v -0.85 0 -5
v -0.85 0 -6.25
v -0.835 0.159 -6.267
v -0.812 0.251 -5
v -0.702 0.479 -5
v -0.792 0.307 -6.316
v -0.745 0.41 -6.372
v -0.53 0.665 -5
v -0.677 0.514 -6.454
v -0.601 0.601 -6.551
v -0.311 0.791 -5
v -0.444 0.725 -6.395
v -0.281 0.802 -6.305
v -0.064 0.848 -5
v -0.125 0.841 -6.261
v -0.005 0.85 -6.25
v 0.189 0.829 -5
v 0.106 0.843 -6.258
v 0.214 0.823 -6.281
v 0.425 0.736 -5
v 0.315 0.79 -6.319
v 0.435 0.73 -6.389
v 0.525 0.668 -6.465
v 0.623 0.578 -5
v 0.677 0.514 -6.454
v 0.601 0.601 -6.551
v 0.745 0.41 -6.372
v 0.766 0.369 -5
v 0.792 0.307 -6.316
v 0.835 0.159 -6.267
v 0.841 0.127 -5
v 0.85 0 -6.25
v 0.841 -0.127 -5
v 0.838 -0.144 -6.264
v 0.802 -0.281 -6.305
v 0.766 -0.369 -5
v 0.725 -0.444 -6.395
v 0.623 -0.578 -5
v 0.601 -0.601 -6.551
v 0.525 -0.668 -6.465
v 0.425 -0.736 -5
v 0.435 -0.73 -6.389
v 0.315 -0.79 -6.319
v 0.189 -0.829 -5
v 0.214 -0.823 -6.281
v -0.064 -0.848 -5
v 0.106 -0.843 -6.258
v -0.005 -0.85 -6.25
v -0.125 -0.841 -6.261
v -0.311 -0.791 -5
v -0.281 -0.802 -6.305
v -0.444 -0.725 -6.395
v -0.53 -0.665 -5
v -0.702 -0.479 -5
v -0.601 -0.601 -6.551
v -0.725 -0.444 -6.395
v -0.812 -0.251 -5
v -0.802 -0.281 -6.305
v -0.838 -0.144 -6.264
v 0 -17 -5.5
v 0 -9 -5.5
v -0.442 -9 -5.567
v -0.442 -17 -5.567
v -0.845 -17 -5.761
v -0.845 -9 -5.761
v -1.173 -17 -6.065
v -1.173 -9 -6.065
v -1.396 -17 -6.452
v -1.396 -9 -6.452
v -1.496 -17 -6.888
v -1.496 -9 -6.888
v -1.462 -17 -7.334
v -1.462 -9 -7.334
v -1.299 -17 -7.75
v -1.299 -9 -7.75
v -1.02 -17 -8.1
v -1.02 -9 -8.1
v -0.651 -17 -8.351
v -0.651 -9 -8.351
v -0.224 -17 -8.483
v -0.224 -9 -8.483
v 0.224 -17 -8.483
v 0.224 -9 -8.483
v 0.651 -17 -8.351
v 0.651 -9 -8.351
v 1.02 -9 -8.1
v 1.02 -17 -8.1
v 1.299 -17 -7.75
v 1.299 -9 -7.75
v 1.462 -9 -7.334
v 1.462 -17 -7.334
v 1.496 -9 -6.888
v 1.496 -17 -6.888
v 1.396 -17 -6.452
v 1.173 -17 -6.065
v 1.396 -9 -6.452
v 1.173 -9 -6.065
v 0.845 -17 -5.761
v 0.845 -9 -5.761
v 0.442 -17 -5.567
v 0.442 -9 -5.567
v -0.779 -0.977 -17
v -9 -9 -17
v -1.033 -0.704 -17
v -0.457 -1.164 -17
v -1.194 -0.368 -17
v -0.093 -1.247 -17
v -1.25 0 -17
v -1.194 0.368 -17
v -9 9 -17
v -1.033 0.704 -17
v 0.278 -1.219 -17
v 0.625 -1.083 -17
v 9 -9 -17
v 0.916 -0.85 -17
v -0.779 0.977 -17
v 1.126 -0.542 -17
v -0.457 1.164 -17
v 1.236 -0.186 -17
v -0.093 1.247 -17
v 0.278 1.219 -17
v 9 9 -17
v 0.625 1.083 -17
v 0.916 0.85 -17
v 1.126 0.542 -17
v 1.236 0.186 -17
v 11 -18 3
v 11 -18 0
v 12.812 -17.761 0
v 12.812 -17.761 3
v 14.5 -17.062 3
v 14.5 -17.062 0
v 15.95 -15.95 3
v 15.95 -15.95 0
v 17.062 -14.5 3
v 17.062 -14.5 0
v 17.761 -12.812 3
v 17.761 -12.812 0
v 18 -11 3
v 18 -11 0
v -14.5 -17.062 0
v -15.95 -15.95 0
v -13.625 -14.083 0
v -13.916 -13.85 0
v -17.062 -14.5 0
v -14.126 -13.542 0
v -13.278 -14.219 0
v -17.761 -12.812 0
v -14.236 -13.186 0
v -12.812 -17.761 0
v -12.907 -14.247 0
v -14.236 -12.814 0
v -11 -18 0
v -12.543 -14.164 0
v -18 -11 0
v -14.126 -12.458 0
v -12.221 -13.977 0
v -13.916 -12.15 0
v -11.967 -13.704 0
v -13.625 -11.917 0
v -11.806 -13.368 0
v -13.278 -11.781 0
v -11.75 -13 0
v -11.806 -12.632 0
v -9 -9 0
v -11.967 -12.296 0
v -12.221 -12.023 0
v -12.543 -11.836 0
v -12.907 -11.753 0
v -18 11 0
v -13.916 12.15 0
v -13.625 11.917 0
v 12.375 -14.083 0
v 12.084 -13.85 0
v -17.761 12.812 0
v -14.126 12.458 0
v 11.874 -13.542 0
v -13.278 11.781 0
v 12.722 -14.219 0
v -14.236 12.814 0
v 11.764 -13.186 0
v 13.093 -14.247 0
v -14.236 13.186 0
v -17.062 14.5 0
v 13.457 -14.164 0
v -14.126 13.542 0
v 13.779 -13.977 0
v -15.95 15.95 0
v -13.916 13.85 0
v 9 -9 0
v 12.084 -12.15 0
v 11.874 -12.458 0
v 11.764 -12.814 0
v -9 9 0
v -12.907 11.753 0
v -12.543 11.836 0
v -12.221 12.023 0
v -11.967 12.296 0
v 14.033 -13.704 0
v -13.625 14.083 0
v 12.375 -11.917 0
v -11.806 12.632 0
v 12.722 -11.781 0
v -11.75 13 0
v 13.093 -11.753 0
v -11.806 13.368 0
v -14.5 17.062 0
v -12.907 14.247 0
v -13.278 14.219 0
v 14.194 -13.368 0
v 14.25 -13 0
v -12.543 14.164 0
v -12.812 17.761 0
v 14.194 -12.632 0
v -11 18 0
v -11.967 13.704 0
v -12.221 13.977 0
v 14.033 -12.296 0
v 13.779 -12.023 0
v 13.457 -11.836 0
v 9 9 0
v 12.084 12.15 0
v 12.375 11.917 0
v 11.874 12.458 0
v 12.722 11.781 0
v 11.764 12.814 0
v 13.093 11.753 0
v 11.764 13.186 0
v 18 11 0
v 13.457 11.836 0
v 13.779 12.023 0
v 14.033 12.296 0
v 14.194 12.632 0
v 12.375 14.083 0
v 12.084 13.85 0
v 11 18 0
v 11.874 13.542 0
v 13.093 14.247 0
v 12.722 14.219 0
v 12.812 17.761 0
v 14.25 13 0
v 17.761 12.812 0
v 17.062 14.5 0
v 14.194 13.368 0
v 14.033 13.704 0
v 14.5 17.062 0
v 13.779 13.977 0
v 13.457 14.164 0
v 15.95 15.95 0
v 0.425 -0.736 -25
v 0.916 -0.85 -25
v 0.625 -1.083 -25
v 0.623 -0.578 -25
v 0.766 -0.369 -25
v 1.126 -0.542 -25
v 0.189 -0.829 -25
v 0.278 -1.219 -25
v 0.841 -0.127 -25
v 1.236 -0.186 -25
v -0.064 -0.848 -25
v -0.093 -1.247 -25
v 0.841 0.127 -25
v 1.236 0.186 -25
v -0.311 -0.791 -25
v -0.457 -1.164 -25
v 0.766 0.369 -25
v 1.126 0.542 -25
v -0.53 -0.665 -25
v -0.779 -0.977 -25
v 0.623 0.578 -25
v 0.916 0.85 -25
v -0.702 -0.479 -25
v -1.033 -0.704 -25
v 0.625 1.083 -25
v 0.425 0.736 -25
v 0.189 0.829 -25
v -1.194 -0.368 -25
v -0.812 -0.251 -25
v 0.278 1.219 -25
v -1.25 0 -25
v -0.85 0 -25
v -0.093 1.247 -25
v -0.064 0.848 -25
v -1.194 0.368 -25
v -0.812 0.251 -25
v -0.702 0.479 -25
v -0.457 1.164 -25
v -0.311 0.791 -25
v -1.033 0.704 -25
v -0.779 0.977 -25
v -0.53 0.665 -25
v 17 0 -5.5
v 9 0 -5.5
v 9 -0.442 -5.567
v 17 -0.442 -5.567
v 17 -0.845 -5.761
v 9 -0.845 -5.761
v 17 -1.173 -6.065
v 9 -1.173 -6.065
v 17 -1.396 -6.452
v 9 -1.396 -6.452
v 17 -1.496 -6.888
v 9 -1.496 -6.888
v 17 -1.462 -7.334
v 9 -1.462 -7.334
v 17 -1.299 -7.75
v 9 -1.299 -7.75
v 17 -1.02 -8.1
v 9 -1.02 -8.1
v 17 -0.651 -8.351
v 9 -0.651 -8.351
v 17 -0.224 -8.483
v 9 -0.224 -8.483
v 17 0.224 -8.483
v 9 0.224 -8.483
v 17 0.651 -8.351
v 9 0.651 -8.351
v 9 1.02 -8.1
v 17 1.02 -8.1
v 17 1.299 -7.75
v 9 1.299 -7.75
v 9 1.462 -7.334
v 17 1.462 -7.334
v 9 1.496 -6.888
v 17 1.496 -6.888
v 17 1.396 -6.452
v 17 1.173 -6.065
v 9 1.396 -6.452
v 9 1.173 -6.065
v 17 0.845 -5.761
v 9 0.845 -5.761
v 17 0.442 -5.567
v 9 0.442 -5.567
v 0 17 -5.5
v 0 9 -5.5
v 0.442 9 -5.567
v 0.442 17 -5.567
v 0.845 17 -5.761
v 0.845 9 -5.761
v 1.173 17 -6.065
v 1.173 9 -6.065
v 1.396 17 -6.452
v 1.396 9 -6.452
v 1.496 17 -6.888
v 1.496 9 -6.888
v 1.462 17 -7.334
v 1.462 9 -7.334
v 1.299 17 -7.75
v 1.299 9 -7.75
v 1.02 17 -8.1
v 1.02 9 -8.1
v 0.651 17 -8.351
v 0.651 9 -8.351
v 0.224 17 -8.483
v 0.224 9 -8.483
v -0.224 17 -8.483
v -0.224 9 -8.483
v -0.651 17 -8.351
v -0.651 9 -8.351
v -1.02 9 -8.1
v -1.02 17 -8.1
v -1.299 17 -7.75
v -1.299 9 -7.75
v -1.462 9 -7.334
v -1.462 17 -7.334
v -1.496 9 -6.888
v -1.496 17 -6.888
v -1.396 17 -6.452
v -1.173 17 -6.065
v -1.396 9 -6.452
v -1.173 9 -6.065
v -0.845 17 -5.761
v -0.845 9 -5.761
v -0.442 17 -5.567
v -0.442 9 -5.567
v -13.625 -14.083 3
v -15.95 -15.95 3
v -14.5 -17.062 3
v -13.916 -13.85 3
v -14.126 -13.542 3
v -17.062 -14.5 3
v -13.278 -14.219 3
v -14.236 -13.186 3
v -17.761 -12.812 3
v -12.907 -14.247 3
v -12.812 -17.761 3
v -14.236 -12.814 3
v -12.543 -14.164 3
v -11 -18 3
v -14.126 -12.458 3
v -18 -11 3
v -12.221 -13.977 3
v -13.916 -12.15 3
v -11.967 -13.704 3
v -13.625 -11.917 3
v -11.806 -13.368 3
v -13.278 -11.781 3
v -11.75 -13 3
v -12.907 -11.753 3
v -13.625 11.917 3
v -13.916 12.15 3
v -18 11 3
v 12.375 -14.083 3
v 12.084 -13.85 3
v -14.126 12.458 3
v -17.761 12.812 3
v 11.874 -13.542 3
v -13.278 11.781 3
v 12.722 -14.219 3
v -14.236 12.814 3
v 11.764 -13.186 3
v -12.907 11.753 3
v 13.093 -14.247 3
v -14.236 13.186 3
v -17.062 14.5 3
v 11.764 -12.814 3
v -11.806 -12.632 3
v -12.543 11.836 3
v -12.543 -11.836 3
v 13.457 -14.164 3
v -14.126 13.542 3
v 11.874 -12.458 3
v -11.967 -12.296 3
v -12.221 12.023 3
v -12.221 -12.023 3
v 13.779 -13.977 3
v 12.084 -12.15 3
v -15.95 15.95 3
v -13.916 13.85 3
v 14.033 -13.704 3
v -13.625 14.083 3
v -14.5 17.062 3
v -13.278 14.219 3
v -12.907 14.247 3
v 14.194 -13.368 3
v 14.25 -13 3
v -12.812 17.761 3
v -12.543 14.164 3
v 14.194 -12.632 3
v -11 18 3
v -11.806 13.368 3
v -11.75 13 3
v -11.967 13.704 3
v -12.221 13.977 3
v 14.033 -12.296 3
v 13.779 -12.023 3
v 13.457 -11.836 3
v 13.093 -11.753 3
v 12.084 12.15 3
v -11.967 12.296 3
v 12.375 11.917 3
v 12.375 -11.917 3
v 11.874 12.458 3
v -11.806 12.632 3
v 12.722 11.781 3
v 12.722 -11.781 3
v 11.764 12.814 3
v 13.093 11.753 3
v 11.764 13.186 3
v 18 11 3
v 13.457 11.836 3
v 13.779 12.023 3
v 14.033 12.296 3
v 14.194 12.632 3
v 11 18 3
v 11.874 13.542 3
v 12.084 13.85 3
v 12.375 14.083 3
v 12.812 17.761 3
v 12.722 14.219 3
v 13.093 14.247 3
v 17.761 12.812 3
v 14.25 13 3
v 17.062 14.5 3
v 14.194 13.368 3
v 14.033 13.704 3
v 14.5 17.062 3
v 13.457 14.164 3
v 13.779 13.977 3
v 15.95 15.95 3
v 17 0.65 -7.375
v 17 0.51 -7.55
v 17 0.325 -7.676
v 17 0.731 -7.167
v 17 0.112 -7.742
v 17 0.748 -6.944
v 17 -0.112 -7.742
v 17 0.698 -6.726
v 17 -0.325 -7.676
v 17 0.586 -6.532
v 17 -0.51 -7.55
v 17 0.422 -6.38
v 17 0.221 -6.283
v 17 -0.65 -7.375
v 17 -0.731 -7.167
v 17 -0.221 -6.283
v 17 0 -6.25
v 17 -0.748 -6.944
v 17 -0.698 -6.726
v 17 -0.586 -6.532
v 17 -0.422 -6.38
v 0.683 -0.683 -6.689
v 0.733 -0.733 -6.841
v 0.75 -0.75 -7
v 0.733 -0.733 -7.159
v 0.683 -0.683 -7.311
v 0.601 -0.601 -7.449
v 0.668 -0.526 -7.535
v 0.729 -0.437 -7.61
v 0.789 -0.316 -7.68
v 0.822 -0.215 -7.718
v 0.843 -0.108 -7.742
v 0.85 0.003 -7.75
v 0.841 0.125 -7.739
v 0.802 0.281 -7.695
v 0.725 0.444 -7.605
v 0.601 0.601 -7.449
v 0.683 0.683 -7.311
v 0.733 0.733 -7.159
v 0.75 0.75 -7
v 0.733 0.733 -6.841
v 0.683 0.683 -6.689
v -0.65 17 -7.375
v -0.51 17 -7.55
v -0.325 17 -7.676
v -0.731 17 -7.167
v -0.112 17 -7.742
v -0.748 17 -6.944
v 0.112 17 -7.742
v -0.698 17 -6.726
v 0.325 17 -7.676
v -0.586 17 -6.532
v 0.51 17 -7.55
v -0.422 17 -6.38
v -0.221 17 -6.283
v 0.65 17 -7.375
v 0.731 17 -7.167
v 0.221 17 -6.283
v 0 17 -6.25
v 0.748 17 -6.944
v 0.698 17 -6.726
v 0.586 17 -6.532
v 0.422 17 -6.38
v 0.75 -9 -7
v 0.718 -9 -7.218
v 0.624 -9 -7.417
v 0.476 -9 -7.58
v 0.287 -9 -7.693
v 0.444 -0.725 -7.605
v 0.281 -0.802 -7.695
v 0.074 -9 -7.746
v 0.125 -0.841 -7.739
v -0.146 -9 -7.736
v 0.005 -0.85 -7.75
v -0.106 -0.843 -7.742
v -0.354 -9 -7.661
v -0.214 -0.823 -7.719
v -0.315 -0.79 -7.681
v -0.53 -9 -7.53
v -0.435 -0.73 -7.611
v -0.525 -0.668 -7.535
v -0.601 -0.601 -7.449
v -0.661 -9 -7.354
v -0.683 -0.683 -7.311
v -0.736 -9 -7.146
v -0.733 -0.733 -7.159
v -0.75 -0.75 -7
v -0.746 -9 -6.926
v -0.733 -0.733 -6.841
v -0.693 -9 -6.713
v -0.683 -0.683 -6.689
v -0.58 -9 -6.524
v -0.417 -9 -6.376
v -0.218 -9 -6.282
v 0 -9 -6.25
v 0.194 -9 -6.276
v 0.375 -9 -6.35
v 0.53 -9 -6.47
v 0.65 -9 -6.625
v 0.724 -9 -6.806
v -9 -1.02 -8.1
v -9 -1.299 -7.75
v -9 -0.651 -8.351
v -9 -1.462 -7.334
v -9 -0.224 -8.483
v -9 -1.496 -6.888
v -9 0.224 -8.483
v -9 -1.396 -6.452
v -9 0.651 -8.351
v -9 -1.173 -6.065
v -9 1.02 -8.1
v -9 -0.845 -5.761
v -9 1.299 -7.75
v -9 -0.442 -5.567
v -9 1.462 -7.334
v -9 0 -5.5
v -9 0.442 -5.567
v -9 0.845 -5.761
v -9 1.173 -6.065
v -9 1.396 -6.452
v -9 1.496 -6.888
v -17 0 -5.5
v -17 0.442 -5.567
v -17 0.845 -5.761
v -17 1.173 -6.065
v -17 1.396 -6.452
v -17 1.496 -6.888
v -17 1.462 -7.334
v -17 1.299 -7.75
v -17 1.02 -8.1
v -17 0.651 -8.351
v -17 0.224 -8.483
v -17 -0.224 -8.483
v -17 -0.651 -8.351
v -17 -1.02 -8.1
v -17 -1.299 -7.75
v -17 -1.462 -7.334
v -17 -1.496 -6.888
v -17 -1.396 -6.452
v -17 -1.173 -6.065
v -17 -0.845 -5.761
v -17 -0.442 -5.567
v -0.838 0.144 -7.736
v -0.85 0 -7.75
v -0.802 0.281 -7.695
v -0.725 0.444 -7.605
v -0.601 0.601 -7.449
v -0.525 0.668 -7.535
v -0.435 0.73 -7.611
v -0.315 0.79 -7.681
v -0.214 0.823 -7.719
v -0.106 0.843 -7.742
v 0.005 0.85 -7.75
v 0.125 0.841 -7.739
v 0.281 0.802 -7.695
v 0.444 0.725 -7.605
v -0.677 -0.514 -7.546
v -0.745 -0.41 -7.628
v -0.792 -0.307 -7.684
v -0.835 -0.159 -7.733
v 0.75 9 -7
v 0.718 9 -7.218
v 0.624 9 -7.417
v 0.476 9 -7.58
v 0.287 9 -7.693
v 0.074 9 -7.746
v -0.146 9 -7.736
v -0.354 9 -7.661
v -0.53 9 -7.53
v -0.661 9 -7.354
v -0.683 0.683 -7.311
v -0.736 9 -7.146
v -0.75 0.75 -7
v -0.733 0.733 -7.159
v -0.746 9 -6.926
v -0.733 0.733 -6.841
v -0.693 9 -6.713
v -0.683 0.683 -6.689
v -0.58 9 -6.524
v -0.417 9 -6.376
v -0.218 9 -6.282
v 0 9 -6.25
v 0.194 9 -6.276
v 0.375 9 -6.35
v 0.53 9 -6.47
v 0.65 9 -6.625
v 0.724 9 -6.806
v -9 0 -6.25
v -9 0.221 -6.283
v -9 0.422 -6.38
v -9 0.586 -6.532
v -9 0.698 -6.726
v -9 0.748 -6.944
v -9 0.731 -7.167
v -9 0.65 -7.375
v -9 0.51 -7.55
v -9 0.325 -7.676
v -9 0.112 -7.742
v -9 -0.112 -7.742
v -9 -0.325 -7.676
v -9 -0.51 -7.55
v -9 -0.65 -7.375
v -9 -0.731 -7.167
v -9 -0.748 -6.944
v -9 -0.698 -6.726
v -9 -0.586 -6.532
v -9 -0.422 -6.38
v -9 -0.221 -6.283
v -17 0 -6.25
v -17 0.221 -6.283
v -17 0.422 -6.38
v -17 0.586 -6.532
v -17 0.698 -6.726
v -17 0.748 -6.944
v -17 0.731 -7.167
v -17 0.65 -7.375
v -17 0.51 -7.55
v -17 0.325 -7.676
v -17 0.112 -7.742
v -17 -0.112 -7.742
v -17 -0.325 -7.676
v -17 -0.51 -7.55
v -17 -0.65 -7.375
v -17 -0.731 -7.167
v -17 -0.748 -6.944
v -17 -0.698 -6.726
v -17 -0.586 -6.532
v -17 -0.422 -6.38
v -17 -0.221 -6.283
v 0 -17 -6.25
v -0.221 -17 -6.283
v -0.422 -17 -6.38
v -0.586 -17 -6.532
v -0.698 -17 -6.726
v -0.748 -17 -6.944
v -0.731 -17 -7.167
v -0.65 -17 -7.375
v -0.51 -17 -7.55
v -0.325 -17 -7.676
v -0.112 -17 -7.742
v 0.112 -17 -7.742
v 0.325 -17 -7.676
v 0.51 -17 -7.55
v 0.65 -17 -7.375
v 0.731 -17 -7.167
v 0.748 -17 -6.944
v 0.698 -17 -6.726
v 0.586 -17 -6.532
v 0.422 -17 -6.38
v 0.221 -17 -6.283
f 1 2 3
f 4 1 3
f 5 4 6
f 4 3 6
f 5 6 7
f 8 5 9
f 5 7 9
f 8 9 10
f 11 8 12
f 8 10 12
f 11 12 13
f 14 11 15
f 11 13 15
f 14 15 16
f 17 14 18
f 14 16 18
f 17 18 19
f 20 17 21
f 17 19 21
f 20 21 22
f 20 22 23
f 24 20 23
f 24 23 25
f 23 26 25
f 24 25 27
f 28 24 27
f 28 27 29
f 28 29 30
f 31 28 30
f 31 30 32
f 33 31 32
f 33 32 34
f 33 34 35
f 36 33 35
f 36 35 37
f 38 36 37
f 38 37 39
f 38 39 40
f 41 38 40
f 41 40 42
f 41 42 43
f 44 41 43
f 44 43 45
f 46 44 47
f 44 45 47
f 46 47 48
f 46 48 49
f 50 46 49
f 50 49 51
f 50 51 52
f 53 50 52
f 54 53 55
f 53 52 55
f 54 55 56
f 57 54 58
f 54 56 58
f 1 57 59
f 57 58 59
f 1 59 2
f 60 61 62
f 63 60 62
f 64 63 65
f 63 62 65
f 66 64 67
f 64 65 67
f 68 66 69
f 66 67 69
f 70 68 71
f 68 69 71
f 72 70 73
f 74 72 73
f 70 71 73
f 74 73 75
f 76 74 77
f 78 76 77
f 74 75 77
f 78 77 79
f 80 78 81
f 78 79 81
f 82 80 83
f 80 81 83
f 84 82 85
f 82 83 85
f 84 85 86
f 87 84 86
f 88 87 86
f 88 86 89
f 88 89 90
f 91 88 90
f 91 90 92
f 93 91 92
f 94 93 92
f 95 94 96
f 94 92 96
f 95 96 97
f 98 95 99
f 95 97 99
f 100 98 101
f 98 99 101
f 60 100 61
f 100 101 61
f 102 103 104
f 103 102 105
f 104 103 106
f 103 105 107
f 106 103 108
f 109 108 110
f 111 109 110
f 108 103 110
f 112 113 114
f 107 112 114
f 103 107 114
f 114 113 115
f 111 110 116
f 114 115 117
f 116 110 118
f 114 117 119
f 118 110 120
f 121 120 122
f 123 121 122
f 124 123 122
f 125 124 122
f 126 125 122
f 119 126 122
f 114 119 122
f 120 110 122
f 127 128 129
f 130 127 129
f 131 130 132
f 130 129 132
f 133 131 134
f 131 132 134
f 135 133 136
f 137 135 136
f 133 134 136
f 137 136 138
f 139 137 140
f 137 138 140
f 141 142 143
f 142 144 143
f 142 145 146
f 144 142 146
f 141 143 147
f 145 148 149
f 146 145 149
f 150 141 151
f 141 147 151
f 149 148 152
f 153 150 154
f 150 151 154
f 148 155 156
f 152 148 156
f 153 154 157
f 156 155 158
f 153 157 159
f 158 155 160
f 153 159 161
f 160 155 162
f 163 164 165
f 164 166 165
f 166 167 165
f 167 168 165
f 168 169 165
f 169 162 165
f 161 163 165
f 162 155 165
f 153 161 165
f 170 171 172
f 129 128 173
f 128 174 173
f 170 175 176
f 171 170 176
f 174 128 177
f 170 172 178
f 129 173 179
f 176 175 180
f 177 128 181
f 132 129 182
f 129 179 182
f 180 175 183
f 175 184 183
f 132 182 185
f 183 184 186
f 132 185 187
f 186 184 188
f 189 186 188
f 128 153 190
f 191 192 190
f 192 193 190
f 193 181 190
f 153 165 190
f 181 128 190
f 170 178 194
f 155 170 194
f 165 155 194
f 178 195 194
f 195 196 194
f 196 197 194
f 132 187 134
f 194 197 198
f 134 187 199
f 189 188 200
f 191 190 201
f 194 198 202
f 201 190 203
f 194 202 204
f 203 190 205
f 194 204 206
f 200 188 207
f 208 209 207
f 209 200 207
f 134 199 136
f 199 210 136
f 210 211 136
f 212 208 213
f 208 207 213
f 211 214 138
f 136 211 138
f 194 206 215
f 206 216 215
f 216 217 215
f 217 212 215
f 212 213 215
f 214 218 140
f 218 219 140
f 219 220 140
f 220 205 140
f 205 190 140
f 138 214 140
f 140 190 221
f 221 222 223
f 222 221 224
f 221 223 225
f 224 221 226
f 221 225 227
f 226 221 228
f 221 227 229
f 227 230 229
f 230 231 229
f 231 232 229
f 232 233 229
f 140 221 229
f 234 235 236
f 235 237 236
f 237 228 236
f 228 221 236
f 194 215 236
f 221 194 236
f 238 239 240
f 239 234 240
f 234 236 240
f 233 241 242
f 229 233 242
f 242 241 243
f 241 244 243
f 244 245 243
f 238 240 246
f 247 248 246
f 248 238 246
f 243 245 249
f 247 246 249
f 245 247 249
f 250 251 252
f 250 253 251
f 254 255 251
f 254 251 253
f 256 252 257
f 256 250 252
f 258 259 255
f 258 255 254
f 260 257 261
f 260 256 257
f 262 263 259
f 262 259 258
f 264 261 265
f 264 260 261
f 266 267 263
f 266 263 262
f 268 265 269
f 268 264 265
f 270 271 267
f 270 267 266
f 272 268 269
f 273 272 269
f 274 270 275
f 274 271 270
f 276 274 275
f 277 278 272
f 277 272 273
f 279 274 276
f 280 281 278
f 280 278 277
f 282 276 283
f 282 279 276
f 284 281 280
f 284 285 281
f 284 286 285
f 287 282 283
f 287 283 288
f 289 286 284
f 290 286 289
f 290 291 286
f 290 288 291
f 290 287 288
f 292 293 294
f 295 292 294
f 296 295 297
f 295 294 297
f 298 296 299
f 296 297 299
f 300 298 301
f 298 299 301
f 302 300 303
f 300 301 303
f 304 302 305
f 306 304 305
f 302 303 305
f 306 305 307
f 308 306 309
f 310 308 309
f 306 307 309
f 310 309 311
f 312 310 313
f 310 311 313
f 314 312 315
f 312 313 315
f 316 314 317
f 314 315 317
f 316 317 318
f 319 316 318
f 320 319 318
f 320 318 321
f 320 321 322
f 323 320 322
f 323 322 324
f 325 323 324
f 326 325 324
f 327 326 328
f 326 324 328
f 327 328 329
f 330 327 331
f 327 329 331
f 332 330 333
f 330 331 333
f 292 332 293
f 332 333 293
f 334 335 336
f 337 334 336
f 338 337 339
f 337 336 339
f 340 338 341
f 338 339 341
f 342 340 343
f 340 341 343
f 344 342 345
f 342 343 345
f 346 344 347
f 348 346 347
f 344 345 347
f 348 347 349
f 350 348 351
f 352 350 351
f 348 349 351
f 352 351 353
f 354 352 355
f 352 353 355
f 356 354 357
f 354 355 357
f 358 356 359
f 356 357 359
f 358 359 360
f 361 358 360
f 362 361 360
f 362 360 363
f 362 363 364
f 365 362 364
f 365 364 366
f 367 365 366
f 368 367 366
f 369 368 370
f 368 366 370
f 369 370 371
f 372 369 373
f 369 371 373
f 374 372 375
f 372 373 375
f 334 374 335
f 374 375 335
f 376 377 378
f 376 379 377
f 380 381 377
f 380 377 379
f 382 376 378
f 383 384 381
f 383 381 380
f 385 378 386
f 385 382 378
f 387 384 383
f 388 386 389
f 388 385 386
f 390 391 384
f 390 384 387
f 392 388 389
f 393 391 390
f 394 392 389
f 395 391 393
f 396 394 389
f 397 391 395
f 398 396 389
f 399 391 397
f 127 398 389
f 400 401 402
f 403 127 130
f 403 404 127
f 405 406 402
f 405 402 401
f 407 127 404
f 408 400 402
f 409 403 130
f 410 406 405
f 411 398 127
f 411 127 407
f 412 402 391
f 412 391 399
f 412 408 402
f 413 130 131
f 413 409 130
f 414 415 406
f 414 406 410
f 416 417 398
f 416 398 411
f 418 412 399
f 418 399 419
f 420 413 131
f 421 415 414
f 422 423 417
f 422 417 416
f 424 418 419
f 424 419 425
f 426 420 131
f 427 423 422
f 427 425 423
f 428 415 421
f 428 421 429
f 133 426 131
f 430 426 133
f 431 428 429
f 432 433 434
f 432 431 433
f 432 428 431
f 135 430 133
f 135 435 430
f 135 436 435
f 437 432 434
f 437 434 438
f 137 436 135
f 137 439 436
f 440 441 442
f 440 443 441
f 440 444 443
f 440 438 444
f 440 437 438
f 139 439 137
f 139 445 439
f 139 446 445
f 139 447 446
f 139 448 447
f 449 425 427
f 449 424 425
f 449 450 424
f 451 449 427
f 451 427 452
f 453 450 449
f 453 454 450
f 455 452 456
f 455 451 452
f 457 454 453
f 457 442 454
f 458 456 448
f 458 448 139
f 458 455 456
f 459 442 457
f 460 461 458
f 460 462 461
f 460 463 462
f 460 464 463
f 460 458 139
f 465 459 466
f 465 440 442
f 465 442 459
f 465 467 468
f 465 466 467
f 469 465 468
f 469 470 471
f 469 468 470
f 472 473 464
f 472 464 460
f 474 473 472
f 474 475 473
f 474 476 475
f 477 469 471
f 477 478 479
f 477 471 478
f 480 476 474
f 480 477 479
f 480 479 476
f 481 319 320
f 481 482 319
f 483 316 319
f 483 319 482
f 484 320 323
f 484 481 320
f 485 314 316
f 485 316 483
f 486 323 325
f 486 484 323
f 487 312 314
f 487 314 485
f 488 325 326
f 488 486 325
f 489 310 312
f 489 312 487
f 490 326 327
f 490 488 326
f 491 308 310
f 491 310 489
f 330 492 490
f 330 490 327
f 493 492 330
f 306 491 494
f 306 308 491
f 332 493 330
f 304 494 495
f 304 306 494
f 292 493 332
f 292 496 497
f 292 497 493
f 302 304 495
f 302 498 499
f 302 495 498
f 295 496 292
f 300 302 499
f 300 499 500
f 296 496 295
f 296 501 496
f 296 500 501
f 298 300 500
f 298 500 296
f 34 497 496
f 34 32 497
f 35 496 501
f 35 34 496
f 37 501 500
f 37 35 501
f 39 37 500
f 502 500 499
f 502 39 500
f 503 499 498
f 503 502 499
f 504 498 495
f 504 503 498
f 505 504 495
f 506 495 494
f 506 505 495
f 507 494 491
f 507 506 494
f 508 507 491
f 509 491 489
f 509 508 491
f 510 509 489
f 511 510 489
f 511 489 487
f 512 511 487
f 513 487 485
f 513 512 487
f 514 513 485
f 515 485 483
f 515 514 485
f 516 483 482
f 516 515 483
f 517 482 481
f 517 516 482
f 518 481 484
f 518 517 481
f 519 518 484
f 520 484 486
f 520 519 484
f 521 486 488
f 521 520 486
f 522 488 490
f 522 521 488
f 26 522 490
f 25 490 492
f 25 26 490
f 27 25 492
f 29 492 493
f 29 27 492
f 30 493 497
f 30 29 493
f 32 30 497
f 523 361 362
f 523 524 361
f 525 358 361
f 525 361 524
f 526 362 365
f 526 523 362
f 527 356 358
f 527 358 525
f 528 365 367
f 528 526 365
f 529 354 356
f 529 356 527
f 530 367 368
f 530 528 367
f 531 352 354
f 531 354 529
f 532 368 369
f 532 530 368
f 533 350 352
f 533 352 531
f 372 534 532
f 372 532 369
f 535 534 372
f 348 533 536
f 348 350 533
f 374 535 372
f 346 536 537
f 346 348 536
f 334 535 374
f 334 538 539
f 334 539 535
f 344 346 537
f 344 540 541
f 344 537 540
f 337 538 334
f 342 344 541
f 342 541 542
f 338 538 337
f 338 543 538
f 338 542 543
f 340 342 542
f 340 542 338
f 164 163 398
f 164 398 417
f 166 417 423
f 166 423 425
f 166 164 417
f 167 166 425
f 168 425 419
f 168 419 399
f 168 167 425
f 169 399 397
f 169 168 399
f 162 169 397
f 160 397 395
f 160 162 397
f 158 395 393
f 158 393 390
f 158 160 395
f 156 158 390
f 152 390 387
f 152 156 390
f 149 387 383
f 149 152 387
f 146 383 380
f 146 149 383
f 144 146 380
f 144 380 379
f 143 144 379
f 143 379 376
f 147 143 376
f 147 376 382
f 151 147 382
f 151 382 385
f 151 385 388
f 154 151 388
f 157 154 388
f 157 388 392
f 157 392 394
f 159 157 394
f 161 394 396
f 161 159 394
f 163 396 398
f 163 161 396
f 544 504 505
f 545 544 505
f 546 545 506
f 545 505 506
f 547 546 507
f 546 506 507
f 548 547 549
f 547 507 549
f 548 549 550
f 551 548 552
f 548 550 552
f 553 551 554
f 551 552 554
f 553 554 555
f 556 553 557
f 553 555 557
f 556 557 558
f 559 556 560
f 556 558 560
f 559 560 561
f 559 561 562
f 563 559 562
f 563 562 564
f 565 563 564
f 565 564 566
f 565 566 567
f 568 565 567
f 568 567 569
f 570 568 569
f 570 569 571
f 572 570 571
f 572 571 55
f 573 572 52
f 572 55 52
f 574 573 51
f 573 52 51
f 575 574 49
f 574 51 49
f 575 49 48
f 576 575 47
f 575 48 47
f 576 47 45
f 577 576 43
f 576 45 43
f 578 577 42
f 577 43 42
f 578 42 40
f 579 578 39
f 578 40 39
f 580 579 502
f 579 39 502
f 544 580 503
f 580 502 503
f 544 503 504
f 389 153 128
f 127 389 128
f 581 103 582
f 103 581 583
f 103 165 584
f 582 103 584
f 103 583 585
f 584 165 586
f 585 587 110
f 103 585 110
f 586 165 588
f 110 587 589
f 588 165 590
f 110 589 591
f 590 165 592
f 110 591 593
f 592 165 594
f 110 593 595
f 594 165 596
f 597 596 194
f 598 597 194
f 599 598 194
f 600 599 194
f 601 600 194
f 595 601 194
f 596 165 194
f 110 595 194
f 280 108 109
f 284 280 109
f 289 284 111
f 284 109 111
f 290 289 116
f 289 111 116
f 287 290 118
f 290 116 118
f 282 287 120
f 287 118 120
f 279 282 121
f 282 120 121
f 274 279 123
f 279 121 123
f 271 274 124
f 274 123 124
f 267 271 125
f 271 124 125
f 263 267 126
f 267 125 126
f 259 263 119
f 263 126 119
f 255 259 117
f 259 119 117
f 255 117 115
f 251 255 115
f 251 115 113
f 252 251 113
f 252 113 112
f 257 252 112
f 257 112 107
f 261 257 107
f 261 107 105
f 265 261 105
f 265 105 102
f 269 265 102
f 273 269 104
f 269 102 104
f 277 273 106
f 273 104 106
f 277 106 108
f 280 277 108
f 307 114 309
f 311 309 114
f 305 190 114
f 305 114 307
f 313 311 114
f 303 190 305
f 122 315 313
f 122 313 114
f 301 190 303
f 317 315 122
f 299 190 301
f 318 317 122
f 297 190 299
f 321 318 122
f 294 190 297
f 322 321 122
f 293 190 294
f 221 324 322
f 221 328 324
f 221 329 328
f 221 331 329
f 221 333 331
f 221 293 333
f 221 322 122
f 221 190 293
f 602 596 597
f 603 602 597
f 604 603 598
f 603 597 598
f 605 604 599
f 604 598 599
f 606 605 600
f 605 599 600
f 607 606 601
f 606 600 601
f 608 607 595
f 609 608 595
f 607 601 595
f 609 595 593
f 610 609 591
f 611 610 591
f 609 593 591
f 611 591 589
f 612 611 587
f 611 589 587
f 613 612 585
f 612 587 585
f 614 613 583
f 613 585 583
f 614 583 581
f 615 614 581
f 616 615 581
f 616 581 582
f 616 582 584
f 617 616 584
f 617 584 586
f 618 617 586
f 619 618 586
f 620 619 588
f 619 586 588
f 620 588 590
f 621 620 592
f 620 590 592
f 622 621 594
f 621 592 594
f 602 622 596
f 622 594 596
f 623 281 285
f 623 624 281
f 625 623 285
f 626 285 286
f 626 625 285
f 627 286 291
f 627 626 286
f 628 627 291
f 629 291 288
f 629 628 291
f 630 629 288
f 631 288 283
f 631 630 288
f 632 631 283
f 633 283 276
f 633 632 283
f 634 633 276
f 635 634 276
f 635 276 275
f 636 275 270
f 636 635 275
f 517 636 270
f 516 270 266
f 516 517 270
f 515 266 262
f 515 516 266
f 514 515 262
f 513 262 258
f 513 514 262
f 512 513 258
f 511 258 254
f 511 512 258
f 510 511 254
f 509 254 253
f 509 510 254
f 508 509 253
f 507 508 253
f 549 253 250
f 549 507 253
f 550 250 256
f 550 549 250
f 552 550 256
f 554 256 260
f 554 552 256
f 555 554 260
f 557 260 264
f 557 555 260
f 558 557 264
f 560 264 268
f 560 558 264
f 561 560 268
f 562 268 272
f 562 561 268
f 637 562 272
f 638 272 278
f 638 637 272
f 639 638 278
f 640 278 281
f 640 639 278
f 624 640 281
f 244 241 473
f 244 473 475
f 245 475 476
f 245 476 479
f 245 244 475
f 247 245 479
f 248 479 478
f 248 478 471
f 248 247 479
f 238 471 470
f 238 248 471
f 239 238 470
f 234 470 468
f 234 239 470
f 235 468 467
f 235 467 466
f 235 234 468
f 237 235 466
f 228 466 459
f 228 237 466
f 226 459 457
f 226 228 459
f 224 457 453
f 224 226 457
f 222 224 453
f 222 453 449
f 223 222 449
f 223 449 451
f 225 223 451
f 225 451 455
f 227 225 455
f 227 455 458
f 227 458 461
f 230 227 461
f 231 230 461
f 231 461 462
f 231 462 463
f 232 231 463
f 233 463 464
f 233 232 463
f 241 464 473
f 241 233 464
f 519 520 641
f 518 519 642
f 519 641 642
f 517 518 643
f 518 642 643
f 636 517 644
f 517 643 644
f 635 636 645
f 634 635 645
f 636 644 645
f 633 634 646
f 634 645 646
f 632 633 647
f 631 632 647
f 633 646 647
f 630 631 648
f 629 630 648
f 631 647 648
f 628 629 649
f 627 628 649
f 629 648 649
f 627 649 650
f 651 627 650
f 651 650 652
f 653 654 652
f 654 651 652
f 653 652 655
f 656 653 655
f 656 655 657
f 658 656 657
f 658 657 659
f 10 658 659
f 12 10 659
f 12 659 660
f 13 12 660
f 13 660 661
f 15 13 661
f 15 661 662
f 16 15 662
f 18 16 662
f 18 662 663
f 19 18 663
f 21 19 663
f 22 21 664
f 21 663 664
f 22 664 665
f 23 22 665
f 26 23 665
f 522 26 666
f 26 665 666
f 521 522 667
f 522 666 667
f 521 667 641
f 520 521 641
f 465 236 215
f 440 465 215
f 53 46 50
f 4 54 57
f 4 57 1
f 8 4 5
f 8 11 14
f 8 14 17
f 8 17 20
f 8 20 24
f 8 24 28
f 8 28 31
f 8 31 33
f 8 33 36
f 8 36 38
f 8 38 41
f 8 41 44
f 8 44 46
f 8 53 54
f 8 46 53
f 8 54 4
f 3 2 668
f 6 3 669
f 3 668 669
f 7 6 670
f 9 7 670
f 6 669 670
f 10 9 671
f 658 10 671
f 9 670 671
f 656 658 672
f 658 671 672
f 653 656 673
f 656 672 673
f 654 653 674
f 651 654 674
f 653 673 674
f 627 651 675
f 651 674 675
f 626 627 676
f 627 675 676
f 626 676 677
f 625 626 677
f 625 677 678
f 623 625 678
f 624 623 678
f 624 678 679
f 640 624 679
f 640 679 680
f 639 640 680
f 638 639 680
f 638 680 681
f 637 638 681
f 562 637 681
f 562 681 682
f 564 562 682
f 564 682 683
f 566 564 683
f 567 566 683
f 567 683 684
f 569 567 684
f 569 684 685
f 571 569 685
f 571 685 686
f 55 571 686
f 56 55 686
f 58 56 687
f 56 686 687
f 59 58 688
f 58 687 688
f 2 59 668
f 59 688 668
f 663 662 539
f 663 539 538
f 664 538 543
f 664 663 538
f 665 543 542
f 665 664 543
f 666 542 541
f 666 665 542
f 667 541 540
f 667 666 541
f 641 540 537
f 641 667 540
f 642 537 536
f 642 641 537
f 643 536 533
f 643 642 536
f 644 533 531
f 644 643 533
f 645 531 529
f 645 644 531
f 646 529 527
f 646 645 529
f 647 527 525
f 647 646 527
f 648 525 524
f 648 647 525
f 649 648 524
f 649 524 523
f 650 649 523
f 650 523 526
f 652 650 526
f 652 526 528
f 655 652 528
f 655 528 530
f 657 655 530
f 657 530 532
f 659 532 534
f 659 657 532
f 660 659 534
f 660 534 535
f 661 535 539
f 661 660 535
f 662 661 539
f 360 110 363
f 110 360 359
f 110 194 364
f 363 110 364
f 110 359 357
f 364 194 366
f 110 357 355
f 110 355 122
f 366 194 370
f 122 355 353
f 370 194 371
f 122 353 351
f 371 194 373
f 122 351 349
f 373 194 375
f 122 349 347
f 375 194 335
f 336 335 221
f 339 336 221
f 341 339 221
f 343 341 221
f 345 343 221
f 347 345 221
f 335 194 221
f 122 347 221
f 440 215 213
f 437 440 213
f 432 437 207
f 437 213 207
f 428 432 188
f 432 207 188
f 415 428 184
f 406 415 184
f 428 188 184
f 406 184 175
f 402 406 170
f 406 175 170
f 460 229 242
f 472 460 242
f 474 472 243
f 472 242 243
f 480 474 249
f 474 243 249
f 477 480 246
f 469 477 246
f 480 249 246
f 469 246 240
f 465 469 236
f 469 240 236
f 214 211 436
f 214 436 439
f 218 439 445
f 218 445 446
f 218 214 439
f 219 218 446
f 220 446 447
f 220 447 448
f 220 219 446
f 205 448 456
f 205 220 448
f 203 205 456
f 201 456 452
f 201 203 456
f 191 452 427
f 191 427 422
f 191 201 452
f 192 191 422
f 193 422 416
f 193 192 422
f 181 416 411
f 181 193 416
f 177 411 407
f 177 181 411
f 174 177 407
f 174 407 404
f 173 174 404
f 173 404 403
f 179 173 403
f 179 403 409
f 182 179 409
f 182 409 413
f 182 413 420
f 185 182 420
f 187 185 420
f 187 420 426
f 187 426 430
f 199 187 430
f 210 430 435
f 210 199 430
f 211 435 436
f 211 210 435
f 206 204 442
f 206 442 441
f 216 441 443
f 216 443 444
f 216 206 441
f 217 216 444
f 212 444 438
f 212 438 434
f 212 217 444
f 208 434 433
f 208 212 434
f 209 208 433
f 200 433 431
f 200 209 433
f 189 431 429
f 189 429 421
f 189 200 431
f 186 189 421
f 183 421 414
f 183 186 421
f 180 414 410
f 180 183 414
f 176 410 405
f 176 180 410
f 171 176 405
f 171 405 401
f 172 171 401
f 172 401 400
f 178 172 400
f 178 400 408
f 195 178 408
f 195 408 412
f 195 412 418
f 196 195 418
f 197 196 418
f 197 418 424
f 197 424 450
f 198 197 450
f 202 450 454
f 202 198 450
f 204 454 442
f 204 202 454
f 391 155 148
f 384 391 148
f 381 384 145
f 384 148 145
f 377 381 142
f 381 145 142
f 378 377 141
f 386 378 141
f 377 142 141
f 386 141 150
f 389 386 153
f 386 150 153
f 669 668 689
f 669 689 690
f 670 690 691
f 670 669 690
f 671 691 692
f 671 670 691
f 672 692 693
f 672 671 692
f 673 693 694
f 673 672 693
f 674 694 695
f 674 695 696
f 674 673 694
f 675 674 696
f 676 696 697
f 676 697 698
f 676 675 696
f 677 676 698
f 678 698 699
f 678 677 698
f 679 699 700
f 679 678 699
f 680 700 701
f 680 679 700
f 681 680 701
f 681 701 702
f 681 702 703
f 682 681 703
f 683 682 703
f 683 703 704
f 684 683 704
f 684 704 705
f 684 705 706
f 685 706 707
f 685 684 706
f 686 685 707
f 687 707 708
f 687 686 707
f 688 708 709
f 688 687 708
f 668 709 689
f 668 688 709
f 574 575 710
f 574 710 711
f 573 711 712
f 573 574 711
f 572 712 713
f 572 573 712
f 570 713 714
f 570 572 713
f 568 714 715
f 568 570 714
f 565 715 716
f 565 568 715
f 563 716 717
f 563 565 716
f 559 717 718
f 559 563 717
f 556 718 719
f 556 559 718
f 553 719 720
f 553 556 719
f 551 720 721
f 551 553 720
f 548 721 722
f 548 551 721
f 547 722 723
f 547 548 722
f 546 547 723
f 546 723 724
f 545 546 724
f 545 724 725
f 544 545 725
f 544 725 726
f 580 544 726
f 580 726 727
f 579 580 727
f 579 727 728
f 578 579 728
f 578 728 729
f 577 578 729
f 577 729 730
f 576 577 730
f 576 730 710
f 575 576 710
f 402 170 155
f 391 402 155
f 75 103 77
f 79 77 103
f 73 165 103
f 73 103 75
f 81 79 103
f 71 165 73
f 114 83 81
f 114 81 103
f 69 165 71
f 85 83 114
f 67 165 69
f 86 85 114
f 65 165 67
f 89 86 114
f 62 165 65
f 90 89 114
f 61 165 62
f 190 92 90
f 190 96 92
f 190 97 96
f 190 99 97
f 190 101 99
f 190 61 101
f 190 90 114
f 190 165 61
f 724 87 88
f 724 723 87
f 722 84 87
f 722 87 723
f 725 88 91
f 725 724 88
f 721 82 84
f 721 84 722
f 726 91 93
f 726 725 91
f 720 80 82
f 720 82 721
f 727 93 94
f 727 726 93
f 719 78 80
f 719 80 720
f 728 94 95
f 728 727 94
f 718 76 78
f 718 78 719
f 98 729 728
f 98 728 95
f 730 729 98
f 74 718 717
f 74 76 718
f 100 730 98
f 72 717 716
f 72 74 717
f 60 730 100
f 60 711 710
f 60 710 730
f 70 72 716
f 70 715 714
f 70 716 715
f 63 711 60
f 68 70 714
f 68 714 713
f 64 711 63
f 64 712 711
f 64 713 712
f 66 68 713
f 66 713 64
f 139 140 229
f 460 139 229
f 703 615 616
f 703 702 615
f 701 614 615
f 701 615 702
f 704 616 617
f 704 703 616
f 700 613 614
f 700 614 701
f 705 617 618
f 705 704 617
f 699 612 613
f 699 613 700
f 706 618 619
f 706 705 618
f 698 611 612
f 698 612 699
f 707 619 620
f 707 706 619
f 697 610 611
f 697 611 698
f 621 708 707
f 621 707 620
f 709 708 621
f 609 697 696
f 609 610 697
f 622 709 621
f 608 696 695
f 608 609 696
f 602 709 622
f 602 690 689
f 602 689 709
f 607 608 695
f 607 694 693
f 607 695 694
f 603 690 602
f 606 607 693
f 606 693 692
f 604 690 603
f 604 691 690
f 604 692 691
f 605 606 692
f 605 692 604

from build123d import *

# Parameters (mm, degrees)
SKETCH_1_R               = 1.25
EXTRUDE_3_DEPTH          = 3
SKETCH_2_W               = 18
SKETCH_2_H               = 18
EXTRUDE_4_DEPTH          = 17
SKETCH_3_R               = 0.85
CUT_EXTRUDE_2_DEPTH      = 12
SKETCH_4_R               = 0.75
CUT_EXTRUDE_4_DEPTH      = 18
SKETCH_5_R               = 0.75
CUT_EXTRUDE_5_DEPTH      = 18
SKETCH_6_R               = 1.5
SKETCH_6_R_2             = 0.75
EXTRUDE_7_DEPTH          = 8
SKETCH_10_R              = 1.25
SKETCH_10_R_2            = 0.85
EXTRUDE_13_DEPTH         = 8
PATTERN_CIRCULAR_1_COUNT = 4


with BuildPart() as part:
    # 草图1 → 凸台-拉伸3 (new body)
    with BuildSketch(Plane.XY):
        with BuildLine():
            Line((-11, -18), (11, -18))
            ThreePointArc((11, -18), (15.949747468, -15.949747468), (18, -11))
            Line((18, -11), (18, 11))
            ThreePointArc((18, 11), (15.949747468, 15.949747468), (11, 18))
            Line((11, 18), (-11, 18))
            ThreePointArc((-11, 18), (-15.949747468, 15.949747468), (-18, 11))
            Line((-18, 11), (-18, -11))
            ThreePointArc((-18, -11), (-15.949747468, -15.949747468), (-11, -18))
        make_face()
        with Locations((13, 13)):
            Circle(SKETCH_1_R, mode=Mode.SUBTRACT)
        with Locations((-13, 13)):
            Circle(SKETCH_1_R, mode=Mode.SUBTRACT)
        with Locations((-13, -13)):
            Circle(SKETCH_1_R, mode=Mode.SUBTRACT)
        with Locations((13, -13)):
            Circle(SKETCH_1_R, mode=Mode.SUBTRACT)
    extrude(amount=EXTRUDE_3_DEPTH)

    # 草图2 → 凸台-拉伸4 (add)
    with BuildSketch(Plane.XY):
        Rectangle(SKETCH_2_W, SKETCH_2_H)
    extrude(amount=-EXTRUDE_4_DEPTH)

    # 草图3 → 切除-拉伸2 (cut)
    with BuildSketch(Plane(origin=(0, 0, -17), x_dir=(-1, 0, 0), z_dir=(0, 0, -1))):
        Circle(SKETCH_3_R)
    extrude(amount=-CUT_EXTRUDE_2_DEPTH, mode=Mode.SUBTRACT)

    # 草图4 → 切除-拉伸4 (cut)
    with BuildSketch(Plane.ZY.offset(9)):
        with Locations((-7, 0)):
            Circle(SKETCH_4_R)
    extrude(amount=-CUT_EXTRUDE_4_DEPTH, mode=Mode.SUBTRACT)

    # 草图5 → 切除-拉伸5 (cut)
    with BuildSketch(Plane(origin=(0, 9, 0), x_dir=(1, 0, 0), z_dir=(0, 1, 0))):
        with Locations((0, 7)):
            Circle(SKETCH_5_R)
    extrude(amount=-CUT_EXTRUDE_5_DEPTH, mode=Mode.SUBTRACT)

    # 草图6 → 凸台-拉伸7 (add)
    with BuildSketch(Plane.ZY.offset(9)):
        with Locations((-7, 0)):
            Circle(SKETCH_6_R)
        with Locations((-7, 0)):
            Circle(SKETCH_6_R_2, mode=Mode.SUBTRACT)
    extrude_7 = extrude(amount=EXTRUDE_7_DEPTH)

    # 草图10 → 凸台-拉伸13 (add)
    with BuildSketch(Plane(origin=(0, 0, -17), x_dir=(-1, 0, 0), z_dir=(0, 0, -1))):
        Circle(SKETCH_10_R)
        Circle(SKETCH_10_R_2, mode=Mode.SUBTRACT)
    extrude(amount=EXTRUDE_13_DEPTH)

    # 阵列(圆周)1: 凸台-拉伸7 ×4 about axis
    pattern_circular_1_axis = Axis((0, 0, 0), (0, 0, 1))
    for i in range(1, PATTERN_CIRCULAR_1_COUNT):
        add(extrude_7.rotate(pattern_circular_1_axis, i * 360 / PATTERN_CIRCULAR_1_COUNT))


solid = part.part
